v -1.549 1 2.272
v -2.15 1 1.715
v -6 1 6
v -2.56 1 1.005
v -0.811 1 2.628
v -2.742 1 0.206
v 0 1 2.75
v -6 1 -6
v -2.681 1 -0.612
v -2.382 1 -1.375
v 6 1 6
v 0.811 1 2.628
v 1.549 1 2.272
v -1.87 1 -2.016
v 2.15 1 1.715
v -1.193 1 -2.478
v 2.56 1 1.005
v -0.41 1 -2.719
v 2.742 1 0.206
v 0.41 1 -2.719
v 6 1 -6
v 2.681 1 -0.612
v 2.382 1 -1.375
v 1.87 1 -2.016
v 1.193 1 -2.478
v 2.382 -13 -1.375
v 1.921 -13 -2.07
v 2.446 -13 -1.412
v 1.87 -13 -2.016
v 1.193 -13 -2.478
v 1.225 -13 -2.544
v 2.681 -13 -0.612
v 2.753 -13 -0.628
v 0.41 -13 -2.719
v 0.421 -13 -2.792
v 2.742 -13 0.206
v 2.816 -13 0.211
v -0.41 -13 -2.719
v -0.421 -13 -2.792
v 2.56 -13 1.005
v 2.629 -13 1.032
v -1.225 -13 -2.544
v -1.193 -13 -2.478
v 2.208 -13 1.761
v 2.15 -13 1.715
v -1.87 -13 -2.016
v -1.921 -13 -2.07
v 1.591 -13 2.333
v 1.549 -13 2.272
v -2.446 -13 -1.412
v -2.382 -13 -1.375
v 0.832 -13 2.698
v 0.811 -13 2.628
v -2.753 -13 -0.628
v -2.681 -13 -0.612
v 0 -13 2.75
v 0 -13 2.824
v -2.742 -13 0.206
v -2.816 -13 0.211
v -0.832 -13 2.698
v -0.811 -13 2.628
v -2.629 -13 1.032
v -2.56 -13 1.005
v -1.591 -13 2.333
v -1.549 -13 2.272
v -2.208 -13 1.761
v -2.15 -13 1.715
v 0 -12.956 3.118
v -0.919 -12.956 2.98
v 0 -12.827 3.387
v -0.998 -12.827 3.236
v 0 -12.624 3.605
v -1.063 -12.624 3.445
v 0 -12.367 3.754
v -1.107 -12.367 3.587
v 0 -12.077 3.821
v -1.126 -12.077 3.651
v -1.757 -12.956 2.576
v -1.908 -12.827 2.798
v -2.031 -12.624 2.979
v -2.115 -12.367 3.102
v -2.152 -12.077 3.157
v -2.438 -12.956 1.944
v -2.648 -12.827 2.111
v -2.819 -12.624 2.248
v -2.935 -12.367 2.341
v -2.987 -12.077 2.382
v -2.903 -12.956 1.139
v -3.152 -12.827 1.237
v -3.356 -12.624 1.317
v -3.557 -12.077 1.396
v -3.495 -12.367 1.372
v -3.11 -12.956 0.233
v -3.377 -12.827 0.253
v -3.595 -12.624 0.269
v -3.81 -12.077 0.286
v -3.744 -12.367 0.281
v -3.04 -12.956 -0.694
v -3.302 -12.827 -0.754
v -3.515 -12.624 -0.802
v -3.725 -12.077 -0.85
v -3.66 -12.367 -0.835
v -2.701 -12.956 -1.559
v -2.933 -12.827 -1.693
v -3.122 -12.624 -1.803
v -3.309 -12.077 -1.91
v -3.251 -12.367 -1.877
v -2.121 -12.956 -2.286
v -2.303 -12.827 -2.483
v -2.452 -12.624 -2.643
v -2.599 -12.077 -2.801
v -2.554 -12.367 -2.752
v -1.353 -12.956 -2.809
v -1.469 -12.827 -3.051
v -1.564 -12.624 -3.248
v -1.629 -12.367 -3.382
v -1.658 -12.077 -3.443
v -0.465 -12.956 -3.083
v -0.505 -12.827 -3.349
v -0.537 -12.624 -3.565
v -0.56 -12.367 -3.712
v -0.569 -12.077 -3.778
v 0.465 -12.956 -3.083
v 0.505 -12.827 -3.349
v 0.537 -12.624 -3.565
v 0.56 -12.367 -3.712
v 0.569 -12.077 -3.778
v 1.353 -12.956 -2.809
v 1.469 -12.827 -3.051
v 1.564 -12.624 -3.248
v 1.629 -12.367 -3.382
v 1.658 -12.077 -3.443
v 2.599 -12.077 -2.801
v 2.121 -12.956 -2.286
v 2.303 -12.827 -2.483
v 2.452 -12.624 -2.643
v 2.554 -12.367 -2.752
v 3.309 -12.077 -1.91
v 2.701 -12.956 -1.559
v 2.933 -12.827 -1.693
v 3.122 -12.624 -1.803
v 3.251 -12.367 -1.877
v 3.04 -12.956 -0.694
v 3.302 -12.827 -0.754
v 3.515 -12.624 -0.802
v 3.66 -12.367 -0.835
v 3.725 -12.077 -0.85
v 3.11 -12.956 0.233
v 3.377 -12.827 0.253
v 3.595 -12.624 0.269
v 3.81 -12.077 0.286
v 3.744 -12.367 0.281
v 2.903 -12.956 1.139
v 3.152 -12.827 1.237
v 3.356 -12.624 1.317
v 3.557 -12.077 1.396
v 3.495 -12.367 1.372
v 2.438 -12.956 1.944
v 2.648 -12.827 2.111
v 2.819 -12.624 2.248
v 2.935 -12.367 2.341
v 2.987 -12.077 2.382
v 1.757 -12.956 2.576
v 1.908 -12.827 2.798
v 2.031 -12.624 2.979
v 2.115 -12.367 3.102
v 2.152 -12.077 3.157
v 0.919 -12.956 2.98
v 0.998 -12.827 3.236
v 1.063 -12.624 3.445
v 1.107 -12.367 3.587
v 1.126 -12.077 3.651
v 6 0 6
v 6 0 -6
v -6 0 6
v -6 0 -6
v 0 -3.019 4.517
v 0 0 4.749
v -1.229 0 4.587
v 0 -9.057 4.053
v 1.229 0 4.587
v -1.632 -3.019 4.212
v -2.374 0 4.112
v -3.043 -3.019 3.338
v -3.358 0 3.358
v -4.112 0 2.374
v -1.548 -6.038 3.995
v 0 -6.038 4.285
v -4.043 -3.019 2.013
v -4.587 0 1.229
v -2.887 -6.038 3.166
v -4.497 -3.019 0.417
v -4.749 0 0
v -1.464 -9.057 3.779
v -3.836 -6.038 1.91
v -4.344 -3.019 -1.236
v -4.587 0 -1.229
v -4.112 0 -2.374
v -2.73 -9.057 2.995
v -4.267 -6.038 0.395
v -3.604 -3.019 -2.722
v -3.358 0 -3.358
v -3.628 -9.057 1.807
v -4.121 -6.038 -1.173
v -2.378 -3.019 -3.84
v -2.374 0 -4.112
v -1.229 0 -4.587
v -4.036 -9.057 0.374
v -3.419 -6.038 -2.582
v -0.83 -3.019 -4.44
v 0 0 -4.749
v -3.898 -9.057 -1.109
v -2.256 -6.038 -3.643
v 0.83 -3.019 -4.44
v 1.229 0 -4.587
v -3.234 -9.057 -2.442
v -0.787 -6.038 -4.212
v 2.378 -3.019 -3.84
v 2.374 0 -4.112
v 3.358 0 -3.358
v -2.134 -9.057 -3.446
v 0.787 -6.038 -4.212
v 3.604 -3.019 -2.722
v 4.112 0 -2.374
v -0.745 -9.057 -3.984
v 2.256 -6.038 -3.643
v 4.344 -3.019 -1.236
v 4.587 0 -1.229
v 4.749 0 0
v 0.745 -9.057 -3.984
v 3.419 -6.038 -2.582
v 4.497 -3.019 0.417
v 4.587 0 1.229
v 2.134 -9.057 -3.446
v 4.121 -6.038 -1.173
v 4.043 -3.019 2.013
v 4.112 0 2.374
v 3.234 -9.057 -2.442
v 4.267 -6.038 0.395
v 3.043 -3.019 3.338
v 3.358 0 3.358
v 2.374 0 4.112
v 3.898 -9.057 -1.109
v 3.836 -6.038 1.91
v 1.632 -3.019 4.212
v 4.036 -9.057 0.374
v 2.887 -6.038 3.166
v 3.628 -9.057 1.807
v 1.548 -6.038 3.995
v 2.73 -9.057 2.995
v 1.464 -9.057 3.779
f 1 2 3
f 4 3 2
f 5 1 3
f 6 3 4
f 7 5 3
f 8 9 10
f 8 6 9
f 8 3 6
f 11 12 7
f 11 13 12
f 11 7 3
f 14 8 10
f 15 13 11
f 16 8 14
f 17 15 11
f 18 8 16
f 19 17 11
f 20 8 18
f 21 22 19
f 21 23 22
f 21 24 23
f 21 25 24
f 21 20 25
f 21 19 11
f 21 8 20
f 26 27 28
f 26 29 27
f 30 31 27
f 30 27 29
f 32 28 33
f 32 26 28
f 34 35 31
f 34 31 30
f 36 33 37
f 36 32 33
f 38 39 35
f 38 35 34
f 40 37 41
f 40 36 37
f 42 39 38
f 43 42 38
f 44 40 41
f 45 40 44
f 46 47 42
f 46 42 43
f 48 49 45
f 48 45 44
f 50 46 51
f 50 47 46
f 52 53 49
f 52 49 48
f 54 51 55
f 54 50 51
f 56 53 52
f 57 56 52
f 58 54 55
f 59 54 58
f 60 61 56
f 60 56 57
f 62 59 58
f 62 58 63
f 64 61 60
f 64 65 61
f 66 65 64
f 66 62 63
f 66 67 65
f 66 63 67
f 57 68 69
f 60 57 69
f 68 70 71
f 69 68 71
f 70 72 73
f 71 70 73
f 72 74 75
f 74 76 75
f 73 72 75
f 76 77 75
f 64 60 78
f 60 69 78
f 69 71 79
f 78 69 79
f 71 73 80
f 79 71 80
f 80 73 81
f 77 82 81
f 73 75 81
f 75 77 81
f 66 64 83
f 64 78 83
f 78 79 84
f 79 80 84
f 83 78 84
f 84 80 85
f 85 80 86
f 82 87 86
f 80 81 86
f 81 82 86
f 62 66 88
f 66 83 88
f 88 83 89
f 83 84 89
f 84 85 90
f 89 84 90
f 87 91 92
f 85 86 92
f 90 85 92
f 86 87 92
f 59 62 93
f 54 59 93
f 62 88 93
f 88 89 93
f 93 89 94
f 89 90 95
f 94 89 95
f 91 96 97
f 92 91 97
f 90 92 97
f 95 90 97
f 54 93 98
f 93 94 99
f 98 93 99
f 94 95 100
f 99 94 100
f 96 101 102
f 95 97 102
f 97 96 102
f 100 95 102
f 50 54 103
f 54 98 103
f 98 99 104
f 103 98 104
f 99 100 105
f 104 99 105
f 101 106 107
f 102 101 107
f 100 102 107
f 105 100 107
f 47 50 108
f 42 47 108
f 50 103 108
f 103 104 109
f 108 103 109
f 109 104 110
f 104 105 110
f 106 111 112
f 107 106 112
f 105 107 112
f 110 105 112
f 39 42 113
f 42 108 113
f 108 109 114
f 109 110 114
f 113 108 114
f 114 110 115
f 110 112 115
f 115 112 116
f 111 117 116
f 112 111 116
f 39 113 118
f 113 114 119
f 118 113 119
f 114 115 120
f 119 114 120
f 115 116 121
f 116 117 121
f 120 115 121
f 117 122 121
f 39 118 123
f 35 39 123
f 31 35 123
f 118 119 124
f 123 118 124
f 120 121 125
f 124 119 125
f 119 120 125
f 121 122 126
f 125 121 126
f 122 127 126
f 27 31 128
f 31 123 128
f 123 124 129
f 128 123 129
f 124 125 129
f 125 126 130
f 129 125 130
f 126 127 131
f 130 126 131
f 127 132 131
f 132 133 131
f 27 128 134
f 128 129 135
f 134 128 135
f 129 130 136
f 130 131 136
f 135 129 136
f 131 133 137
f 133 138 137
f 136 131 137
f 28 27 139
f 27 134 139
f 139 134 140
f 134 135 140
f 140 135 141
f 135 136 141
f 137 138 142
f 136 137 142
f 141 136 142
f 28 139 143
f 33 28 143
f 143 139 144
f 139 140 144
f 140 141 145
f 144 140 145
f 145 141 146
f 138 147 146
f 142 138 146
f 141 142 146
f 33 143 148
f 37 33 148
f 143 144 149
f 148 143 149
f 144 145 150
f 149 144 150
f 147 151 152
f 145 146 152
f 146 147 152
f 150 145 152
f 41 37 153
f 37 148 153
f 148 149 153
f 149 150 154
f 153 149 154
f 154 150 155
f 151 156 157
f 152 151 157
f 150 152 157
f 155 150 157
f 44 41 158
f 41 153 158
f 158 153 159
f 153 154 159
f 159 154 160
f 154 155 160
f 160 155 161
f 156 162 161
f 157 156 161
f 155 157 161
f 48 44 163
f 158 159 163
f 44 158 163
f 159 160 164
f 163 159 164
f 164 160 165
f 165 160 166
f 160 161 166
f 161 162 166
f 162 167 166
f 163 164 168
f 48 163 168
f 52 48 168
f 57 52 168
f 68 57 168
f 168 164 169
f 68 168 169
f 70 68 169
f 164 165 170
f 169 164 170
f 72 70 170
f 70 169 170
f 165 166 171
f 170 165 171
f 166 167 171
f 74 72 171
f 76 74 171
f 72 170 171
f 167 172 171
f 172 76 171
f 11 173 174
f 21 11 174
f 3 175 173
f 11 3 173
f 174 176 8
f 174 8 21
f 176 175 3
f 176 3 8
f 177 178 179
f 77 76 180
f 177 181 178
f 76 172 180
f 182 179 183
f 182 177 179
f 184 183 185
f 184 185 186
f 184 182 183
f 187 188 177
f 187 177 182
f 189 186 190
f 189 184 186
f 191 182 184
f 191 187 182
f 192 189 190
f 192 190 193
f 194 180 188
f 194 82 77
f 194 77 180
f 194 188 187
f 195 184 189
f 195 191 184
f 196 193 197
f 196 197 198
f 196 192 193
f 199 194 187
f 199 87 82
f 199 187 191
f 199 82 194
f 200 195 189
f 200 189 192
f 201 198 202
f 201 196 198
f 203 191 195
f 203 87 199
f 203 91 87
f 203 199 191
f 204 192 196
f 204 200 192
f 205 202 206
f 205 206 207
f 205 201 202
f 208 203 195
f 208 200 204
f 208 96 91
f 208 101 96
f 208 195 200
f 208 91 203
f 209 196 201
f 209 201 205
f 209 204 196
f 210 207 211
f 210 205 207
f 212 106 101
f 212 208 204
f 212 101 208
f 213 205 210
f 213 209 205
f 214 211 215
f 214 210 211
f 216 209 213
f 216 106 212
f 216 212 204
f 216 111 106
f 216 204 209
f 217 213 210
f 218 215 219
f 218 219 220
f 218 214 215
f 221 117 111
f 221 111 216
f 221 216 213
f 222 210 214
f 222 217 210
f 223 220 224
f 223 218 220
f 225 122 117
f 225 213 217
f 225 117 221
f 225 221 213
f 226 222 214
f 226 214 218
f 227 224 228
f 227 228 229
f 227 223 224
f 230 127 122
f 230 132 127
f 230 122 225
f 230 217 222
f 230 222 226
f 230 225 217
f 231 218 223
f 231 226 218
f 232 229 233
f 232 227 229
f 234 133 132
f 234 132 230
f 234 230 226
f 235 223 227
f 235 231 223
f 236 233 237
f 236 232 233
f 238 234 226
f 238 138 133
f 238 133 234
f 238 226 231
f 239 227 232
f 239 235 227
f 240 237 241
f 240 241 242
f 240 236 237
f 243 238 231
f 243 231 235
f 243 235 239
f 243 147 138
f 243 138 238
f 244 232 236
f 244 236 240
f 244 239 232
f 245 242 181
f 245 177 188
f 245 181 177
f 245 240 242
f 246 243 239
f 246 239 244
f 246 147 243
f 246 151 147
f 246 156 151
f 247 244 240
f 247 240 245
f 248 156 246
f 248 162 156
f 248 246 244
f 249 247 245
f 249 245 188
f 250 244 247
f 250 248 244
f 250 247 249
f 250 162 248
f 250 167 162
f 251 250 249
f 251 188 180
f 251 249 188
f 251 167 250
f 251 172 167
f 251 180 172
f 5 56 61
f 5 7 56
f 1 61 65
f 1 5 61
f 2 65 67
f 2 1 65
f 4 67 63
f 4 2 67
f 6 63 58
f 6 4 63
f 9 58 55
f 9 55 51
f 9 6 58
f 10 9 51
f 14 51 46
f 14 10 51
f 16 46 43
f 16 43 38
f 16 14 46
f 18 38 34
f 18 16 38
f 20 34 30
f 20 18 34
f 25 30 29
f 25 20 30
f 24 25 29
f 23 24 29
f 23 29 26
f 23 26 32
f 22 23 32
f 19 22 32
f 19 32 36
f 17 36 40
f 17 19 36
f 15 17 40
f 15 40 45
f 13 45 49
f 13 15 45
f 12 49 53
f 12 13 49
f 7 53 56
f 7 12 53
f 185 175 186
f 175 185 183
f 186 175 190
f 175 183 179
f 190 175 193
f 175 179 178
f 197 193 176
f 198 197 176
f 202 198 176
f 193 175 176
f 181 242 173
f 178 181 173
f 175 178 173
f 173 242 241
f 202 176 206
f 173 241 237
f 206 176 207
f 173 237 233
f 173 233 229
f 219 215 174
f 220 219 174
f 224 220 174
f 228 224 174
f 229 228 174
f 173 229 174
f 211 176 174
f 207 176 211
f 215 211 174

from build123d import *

# Parameters (mm, degrees)
SCHIZZO1_W                   = 12
SCHIZZO1_H                   = 12
SCHIZZO1_R                   = 2.75
ESTRUSIONE_ESTRUSIONE1_DEPTH = 1
RACCORDO1_R                  = 1


with BuildPart() as part:
    # Schizzo1 → Estrusione-Estrusione1 (new body)
    with BuildSketch(Plane(origin=(0, 0, 0), x_dir=(1, 0, 0), z_dir=(0, 1, 0))):
        Rectangle(SCHIZZO1_W, SCHIZZO1_H)
        with Locations(Location((0, 0, 0), (0, 0, 270))):
            Circle(SCHIZZO1_R, mode=Mode.SUBTRACT)
    extrude(amount=ESTRUSIONE_ESTRUSIONE1_DEPTH)

    # Schizzo2 → Rivoluzione1 (revolve)
    with BuildSketch(Plane.XY, mode=Mode.PRIVATE) as rivoluzione1_sk:
        Polygon((3.75, -13), (2.75, -13), (2.75, 0), (4.748642917, 0), align=None)
    revolve(rivoluzione1_sk.sketch.rotate(Axis((0, 0, 0), (0, -1, 0)), 90), axis=Axis((0, 0, 0), (0, -1, 0)))

    # Raccordo1
    raccordo1_edges = [part.edges().sort_by_distance(p)[0] for p in [
        (0, -13, -3.75),
    ]]
    fillet(raccordo1_edges, radius=RACCORDO1_R)


solid = part.part
